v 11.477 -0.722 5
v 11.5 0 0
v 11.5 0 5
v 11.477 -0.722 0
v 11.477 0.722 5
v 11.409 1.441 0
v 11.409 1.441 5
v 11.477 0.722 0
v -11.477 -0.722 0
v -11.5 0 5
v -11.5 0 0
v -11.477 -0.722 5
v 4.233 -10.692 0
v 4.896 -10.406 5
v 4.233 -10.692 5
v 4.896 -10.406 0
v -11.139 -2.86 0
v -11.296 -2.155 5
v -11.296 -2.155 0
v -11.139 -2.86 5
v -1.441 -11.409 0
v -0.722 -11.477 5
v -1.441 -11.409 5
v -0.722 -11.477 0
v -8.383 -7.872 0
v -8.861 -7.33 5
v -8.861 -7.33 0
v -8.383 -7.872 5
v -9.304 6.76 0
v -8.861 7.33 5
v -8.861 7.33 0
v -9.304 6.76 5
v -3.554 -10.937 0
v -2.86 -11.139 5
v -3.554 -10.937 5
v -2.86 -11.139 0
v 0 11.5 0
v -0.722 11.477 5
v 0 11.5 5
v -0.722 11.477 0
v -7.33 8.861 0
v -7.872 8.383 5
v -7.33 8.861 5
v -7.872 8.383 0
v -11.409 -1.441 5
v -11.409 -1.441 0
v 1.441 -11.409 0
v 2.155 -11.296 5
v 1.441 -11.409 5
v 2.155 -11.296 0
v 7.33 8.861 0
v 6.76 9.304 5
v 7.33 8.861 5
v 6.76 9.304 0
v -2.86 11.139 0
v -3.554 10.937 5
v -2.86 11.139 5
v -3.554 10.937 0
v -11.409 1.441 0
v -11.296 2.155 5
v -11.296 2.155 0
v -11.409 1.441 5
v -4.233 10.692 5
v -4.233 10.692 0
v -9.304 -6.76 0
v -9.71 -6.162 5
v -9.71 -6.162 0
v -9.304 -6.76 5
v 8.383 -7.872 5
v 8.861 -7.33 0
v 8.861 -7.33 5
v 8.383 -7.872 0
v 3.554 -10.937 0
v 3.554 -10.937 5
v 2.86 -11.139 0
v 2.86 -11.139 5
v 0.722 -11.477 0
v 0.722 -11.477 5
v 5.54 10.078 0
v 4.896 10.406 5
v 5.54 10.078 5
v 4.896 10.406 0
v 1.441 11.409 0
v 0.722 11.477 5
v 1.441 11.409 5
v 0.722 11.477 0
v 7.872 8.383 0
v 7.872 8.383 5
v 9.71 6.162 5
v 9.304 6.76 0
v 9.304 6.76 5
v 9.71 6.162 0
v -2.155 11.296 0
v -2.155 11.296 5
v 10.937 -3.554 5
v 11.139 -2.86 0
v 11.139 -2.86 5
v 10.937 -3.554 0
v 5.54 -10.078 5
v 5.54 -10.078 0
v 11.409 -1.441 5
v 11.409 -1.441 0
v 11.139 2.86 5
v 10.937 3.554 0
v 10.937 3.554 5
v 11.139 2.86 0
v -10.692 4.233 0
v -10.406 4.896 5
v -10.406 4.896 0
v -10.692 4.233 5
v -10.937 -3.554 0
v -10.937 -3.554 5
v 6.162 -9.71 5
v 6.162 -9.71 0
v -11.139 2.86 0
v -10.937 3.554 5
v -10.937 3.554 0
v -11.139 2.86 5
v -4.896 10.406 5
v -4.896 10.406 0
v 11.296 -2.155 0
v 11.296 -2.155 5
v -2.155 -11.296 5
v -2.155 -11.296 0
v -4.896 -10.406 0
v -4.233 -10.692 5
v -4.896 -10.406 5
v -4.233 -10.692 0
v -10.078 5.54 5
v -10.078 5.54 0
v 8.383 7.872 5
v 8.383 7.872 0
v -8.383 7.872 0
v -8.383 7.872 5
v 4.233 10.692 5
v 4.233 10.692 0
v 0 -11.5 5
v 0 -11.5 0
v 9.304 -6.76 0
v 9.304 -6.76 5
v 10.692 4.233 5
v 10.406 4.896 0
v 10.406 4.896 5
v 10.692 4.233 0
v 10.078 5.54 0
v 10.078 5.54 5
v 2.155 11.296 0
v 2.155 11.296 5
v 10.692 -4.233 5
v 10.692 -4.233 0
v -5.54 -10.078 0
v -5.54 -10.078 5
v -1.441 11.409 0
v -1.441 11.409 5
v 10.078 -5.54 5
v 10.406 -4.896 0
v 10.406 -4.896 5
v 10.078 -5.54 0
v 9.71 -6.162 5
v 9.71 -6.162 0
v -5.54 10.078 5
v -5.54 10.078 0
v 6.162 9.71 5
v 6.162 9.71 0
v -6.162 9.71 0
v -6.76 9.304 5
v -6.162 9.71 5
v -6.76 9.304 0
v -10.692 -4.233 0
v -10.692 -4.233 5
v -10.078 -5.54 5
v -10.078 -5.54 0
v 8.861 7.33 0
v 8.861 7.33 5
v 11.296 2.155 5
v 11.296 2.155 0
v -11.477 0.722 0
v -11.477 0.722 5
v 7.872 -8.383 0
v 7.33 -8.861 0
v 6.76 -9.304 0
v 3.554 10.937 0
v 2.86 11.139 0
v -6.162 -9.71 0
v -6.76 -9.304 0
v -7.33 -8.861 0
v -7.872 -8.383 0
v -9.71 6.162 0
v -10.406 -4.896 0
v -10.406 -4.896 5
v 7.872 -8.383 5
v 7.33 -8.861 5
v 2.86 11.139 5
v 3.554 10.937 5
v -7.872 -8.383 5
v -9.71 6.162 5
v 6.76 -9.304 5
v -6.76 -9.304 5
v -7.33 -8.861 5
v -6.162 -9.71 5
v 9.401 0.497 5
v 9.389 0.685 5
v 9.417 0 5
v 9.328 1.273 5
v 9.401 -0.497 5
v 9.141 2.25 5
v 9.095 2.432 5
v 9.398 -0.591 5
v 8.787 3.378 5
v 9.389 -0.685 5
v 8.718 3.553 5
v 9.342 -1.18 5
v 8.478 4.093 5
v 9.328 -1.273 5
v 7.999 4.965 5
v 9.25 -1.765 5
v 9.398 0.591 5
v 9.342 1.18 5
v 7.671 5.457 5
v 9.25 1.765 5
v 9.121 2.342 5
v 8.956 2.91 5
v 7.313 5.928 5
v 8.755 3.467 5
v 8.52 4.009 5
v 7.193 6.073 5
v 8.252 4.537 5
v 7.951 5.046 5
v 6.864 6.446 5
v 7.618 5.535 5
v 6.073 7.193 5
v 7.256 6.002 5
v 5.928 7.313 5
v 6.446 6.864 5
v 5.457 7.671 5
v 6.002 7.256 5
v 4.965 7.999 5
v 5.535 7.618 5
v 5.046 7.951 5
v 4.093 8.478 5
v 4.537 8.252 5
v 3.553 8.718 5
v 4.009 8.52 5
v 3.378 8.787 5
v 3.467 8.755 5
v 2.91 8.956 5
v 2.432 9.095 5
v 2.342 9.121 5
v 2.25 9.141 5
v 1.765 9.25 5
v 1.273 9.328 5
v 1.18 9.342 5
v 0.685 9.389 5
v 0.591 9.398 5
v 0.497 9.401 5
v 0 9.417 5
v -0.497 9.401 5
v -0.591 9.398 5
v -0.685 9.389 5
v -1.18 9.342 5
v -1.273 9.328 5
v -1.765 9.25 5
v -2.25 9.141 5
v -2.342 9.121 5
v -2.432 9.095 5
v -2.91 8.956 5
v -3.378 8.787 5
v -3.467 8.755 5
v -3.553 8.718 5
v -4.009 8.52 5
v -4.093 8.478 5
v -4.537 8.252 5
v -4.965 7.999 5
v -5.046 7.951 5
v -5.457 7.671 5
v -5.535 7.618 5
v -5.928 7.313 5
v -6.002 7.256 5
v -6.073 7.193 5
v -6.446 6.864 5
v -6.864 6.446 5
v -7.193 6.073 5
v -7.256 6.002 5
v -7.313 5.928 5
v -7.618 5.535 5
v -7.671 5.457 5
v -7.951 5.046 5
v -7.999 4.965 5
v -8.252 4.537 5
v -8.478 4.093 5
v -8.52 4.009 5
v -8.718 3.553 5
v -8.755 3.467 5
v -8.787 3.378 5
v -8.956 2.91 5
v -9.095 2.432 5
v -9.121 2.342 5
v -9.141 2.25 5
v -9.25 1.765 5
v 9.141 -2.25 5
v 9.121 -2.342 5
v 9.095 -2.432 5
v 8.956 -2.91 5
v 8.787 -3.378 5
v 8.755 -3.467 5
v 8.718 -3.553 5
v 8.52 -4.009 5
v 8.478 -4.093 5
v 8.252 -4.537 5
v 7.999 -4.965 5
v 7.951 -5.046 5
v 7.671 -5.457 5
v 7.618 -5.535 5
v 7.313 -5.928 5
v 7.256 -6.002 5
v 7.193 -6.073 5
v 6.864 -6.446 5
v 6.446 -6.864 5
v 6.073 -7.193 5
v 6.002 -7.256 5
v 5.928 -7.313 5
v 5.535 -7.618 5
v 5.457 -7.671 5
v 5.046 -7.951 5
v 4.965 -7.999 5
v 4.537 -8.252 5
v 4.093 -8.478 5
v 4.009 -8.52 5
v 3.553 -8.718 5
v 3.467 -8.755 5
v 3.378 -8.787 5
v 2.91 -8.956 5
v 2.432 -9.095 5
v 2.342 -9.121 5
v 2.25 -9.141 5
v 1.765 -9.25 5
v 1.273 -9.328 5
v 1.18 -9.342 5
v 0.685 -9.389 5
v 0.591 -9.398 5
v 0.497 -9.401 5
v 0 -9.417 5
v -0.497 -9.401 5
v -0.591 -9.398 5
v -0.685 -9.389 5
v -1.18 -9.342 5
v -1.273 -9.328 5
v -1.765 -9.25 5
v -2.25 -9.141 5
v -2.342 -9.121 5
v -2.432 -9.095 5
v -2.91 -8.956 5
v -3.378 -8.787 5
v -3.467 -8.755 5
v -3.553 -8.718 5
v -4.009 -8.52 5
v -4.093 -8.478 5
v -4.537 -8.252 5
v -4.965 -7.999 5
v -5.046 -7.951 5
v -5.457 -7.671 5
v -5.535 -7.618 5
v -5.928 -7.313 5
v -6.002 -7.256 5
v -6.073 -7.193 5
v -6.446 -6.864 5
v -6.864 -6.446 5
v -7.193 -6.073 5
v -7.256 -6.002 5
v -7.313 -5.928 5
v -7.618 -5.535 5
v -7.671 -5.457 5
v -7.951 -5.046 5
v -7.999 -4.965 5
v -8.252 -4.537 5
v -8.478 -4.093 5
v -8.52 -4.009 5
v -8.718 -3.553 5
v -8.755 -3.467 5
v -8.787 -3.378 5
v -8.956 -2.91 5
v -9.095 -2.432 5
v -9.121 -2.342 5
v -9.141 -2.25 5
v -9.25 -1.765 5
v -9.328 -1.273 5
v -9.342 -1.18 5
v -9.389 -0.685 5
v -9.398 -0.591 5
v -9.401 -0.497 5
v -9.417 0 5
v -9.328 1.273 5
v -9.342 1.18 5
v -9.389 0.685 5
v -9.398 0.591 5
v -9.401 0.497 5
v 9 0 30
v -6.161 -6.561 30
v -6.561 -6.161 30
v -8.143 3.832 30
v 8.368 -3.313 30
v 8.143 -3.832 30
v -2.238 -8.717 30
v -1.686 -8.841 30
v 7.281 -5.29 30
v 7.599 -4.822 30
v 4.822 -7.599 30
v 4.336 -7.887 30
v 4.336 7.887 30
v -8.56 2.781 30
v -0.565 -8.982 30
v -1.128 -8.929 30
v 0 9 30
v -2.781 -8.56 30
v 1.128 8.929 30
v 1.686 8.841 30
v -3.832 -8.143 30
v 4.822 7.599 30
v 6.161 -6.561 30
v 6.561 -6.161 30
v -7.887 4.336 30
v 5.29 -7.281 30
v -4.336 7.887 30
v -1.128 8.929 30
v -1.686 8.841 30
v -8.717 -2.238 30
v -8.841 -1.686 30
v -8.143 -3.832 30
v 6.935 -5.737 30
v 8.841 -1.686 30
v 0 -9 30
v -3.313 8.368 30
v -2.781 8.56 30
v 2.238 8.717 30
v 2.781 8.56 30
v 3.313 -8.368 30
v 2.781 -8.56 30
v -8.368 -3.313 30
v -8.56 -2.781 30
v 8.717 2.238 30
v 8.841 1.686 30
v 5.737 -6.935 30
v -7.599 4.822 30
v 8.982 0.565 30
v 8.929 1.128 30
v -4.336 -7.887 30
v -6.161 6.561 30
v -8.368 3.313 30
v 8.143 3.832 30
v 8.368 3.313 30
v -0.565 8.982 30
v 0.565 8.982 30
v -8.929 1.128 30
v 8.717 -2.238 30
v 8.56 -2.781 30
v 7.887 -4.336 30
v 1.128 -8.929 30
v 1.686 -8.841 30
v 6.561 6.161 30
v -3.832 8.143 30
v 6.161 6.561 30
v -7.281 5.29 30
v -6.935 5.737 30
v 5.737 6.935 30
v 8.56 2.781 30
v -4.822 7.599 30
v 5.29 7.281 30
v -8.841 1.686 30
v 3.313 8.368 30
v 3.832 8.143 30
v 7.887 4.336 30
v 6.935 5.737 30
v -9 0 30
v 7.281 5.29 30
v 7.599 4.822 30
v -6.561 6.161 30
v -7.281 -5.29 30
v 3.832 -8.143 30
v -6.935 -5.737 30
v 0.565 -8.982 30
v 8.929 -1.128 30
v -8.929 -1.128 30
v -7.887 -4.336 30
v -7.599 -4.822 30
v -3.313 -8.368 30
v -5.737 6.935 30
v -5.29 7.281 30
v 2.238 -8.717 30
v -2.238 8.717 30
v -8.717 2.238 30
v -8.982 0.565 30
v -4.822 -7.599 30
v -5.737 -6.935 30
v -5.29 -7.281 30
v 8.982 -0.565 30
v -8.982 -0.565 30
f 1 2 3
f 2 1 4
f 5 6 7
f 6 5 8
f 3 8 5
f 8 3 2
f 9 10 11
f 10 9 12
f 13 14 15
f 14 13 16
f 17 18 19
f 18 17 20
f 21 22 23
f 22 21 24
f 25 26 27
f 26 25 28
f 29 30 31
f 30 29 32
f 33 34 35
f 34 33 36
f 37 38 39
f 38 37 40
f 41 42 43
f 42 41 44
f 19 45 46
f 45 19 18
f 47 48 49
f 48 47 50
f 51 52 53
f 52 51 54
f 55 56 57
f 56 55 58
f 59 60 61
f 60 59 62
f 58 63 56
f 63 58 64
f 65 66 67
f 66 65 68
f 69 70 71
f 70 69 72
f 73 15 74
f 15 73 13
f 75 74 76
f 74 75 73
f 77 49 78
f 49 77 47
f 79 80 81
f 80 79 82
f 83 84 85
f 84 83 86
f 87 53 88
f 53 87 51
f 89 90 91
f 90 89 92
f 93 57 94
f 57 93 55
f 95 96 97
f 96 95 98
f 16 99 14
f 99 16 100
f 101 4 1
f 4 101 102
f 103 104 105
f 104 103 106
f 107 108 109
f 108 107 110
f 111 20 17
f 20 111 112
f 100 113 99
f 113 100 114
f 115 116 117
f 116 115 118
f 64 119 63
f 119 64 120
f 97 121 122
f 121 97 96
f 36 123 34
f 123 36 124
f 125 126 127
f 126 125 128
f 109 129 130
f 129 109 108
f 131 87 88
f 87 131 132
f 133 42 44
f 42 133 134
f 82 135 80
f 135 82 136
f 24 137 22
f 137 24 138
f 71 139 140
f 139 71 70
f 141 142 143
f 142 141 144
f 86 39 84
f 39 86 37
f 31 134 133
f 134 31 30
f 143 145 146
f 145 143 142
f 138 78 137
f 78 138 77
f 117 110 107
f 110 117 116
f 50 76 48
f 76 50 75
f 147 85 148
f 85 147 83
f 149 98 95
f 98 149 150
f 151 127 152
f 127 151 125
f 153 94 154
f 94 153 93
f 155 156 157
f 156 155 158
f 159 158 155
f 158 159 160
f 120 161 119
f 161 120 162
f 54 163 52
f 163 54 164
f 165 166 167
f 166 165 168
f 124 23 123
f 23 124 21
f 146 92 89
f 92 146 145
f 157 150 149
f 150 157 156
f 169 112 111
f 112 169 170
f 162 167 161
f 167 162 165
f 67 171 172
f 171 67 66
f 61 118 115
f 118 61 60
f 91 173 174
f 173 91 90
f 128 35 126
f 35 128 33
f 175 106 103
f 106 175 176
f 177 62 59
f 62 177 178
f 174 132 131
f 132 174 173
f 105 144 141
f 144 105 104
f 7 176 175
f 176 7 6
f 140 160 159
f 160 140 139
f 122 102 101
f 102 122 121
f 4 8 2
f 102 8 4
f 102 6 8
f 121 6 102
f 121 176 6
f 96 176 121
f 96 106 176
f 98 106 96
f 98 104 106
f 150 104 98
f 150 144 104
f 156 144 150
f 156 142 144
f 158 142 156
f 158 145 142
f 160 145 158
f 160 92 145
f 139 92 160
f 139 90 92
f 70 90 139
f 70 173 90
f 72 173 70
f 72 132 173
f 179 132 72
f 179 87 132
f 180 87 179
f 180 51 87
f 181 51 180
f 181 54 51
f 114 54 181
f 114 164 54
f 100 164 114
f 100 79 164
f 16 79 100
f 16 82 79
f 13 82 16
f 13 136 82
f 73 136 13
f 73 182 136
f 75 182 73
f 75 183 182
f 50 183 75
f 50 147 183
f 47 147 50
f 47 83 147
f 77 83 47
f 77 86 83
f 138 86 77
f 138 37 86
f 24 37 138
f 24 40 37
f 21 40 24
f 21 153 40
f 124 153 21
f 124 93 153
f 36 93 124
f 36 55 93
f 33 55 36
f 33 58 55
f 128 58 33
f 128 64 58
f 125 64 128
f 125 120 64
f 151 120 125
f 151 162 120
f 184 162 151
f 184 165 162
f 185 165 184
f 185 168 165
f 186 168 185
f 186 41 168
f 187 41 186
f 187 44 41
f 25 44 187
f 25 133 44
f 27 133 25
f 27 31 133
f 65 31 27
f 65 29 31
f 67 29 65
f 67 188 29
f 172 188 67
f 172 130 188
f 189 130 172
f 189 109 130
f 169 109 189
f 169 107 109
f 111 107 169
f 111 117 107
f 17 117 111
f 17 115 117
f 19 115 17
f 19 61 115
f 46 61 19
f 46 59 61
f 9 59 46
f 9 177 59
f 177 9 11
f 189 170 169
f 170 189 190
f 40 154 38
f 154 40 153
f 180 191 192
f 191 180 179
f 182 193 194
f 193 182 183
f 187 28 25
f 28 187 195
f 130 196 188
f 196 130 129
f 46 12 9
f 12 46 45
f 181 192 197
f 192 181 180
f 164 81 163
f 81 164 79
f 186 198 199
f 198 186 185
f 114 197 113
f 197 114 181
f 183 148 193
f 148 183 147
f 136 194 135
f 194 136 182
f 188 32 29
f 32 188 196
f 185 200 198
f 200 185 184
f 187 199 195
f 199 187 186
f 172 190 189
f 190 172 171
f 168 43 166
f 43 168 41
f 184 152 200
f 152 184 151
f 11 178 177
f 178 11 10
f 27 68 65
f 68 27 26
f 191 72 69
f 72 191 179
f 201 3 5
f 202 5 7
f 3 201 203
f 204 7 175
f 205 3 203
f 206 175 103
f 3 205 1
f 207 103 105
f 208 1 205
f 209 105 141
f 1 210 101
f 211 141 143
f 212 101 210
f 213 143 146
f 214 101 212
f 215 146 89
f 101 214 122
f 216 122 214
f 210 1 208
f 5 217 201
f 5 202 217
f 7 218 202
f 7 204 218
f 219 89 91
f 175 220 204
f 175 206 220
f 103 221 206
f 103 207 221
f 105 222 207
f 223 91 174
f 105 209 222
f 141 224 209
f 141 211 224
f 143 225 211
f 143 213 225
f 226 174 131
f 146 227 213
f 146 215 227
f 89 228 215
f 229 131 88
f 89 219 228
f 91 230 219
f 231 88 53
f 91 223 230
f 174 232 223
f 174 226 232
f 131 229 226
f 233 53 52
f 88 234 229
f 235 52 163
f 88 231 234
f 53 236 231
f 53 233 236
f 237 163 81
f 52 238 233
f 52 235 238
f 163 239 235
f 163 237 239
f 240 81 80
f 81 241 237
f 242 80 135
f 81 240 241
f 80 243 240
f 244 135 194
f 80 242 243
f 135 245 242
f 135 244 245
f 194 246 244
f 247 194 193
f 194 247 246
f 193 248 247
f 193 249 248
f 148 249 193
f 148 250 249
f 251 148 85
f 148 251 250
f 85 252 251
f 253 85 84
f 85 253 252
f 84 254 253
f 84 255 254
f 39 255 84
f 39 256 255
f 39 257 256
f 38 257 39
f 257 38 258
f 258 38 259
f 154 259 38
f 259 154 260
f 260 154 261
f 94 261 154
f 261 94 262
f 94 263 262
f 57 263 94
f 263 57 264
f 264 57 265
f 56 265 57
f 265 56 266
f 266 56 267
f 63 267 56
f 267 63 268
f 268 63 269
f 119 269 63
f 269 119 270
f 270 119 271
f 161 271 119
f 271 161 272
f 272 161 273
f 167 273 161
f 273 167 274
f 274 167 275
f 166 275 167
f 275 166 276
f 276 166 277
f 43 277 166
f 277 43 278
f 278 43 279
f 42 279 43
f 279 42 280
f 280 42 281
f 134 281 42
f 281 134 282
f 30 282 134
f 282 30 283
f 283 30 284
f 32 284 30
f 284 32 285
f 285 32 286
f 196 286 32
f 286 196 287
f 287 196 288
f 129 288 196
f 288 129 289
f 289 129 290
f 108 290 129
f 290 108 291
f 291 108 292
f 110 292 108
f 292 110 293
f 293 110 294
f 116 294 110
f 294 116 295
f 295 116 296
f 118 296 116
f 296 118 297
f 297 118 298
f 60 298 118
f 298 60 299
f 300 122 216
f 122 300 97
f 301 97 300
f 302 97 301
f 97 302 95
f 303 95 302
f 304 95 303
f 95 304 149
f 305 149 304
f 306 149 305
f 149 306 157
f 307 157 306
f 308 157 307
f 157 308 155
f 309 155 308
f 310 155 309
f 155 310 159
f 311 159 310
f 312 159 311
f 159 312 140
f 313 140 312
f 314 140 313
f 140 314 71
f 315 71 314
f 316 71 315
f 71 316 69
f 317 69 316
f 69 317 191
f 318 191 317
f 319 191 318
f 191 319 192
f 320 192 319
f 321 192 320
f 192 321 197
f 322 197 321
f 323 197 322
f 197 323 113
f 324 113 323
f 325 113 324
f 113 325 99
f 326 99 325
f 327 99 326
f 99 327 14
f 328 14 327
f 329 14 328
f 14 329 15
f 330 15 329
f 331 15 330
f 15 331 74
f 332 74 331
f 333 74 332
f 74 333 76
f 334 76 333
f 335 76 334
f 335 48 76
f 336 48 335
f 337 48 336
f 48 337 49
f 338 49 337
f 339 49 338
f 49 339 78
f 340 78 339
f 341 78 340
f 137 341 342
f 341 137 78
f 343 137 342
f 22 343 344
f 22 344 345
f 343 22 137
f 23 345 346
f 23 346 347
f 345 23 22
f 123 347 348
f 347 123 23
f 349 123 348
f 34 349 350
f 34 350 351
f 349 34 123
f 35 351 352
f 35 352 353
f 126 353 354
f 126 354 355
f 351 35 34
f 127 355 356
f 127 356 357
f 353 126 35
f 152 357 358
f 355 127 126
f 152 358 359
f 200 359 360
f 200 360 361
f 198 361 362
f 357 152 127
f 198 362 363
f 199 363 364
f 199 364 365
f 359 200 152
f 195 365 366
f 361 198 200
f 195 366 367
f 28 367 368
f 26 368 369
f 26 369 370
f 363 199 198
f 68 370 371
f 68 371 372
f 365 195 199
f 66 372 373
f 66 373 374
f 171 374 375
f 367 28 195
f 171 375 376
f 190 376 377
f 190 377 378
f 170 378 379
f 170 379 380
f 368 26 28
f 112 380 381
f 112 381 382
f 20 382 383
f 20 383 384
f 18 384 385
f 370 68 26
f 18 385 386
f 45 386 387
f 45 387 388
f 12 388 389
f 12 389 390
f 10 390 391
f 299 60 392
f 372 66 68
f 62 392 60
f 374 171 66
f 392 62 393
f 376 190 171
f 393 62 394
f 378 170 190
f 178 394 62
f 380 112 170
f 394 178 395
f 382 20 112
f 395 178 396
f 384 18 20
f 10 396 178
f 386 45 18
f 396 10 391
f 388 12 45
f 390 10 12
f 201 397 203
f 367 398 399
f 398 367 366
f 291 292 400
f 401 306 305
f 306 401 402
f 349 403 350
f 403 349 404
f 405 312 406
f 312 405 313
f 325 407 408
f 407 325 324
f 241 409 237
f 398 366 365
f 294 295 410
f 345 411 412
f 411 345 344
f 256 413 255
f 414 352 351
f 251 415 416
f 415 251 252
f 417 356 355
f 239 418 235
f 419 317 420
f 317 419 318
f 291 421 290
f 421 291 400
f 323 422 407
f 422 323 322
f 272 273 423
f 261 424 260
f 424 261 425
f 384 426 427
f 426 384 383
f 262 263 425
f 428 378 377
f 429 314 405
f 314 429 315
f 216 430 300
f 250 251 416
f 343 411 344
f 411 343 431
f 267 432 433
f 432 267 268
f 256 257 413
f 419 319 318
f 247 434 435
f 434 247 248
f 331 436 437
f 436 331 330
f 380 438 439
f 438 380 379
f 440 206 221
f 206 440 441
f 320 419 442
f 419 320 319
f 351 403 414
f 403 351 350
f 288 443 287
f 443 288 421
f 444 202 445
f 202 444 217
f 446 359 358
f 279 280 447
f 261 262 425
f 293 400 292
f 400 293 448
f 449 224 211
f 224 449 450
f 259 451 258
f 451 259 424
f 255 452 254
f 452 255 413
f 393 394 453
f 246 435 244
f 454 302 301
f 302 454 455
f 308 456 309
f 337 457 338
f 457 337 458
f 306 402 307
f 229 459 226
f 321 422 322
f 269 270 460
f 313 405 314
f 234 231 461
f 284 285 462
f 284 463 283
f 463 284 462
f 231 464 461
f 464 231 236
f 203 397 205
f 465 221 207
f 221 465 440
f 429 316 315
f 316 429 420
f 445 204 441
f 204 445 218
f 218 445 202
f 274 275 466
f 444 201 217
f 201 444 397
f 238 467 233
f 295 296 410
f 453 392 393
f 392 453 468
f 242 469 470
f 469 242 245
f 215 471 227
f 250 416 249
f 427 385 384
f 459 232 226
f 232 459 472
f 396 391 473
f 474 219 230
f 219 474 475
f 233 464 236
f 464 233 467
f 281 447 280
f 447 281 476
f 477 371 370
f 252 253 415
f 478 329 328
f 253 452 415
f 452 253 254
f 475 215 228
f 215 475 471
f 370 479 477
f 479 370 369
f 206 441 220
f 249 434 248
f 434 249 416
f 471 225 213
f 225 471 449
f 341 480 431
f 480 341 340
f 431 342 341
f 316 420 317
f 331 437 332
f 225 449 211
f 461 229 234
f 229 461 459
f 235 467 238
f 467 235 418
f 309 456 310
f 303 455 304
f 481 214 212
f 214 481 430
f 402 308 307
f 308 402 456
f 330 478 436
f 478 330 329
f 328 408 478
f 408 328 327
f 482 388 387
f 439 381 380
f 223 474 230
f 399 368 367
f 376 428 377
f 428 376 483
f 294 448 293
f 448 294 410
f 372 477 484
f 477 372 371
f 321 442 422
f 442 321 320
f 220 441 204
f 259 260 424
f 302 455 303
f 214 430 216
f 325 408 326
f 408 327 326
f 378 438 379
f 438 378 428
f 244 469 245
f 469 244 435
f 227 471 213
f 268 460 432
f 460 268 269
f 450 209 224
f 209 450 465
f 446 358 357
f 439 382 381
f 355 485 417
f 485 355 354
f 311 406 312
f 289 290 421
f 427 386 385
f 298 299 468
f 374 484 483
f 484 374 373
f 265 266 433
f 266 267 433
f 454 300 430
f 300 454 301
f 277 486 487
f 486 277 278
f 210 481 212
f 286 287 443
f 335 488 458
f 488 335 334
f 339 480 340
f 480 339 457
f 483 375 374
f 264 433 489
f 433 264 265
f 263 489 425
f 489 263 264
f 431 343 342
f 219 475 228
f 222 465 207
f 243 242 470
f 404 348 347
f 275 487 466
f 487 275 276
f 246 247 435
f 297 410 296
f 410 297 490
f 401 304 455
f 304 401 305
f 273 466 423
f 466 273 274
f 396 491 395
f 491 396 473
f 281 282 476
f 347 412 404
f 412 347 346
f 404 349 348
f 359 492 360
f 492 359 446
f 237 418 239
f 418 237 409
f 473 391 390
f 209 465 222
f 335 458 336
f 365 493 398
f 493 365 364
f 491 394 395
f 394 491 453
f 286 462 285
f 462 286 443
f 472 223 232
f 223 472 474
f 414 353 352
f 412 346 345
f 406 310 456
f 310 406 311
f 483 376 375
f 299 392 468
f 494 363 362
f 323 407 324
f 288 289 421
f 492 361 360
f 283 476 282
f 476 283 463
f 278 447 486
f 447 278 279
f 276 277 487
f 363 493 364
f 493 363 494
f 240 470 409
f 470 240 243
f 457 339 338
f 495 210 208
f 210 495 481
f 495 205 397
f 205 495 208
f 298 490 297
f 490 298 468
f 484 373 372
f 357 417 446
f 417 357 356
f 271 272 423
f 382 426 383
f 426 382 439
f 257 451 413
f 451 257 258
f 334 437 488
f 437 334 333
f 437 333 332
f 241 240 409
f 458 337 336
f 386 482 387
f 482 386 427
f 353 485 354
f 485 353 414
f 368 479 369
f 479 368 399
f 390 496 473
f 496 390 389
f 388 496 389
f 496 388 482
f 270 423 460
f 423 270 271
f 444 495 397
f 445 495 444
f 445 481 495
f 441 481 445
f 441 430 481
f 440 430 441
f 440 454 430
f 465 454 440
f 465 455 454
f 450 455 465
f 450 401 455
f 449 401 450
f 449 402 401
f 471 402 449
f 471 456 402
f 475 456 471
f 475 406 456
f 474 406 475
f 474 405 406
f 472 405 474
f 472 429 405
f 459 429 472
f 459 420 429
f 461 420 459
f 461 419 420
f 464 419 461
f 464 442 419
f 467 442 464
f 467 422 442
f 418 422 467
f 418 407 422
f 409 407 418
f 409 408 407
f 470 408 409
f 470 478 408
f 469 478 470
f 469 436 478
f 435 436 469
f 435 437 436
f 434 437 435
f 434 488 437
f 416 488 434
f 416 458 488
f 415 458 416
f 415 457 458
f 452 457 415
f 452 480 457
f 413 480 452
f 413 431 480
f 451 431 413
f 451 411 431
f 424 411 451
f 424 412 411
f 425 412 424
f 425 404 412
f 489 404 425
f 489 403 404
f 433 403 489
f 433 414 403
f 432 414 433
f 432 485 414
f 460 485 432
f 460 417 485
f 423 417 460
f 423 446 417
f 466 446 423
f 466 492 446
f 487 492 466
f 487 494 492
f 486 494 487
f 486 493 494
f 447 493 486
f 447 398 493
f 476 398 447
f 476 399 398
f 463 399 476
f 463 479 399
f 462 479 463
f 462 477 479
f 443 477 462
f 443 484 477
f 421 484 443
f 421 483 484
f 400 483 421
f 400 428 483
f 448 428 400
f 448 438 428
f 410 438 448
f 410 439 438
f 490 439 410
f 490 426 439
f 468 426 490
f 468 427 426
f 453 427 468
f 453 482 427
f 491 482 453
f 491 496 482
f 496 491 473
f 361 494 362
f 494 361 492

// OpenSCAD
$fn=100;

cylinder(h=5, d=23, center=false);
cylinder(h=30, d1=19, d2=18);
